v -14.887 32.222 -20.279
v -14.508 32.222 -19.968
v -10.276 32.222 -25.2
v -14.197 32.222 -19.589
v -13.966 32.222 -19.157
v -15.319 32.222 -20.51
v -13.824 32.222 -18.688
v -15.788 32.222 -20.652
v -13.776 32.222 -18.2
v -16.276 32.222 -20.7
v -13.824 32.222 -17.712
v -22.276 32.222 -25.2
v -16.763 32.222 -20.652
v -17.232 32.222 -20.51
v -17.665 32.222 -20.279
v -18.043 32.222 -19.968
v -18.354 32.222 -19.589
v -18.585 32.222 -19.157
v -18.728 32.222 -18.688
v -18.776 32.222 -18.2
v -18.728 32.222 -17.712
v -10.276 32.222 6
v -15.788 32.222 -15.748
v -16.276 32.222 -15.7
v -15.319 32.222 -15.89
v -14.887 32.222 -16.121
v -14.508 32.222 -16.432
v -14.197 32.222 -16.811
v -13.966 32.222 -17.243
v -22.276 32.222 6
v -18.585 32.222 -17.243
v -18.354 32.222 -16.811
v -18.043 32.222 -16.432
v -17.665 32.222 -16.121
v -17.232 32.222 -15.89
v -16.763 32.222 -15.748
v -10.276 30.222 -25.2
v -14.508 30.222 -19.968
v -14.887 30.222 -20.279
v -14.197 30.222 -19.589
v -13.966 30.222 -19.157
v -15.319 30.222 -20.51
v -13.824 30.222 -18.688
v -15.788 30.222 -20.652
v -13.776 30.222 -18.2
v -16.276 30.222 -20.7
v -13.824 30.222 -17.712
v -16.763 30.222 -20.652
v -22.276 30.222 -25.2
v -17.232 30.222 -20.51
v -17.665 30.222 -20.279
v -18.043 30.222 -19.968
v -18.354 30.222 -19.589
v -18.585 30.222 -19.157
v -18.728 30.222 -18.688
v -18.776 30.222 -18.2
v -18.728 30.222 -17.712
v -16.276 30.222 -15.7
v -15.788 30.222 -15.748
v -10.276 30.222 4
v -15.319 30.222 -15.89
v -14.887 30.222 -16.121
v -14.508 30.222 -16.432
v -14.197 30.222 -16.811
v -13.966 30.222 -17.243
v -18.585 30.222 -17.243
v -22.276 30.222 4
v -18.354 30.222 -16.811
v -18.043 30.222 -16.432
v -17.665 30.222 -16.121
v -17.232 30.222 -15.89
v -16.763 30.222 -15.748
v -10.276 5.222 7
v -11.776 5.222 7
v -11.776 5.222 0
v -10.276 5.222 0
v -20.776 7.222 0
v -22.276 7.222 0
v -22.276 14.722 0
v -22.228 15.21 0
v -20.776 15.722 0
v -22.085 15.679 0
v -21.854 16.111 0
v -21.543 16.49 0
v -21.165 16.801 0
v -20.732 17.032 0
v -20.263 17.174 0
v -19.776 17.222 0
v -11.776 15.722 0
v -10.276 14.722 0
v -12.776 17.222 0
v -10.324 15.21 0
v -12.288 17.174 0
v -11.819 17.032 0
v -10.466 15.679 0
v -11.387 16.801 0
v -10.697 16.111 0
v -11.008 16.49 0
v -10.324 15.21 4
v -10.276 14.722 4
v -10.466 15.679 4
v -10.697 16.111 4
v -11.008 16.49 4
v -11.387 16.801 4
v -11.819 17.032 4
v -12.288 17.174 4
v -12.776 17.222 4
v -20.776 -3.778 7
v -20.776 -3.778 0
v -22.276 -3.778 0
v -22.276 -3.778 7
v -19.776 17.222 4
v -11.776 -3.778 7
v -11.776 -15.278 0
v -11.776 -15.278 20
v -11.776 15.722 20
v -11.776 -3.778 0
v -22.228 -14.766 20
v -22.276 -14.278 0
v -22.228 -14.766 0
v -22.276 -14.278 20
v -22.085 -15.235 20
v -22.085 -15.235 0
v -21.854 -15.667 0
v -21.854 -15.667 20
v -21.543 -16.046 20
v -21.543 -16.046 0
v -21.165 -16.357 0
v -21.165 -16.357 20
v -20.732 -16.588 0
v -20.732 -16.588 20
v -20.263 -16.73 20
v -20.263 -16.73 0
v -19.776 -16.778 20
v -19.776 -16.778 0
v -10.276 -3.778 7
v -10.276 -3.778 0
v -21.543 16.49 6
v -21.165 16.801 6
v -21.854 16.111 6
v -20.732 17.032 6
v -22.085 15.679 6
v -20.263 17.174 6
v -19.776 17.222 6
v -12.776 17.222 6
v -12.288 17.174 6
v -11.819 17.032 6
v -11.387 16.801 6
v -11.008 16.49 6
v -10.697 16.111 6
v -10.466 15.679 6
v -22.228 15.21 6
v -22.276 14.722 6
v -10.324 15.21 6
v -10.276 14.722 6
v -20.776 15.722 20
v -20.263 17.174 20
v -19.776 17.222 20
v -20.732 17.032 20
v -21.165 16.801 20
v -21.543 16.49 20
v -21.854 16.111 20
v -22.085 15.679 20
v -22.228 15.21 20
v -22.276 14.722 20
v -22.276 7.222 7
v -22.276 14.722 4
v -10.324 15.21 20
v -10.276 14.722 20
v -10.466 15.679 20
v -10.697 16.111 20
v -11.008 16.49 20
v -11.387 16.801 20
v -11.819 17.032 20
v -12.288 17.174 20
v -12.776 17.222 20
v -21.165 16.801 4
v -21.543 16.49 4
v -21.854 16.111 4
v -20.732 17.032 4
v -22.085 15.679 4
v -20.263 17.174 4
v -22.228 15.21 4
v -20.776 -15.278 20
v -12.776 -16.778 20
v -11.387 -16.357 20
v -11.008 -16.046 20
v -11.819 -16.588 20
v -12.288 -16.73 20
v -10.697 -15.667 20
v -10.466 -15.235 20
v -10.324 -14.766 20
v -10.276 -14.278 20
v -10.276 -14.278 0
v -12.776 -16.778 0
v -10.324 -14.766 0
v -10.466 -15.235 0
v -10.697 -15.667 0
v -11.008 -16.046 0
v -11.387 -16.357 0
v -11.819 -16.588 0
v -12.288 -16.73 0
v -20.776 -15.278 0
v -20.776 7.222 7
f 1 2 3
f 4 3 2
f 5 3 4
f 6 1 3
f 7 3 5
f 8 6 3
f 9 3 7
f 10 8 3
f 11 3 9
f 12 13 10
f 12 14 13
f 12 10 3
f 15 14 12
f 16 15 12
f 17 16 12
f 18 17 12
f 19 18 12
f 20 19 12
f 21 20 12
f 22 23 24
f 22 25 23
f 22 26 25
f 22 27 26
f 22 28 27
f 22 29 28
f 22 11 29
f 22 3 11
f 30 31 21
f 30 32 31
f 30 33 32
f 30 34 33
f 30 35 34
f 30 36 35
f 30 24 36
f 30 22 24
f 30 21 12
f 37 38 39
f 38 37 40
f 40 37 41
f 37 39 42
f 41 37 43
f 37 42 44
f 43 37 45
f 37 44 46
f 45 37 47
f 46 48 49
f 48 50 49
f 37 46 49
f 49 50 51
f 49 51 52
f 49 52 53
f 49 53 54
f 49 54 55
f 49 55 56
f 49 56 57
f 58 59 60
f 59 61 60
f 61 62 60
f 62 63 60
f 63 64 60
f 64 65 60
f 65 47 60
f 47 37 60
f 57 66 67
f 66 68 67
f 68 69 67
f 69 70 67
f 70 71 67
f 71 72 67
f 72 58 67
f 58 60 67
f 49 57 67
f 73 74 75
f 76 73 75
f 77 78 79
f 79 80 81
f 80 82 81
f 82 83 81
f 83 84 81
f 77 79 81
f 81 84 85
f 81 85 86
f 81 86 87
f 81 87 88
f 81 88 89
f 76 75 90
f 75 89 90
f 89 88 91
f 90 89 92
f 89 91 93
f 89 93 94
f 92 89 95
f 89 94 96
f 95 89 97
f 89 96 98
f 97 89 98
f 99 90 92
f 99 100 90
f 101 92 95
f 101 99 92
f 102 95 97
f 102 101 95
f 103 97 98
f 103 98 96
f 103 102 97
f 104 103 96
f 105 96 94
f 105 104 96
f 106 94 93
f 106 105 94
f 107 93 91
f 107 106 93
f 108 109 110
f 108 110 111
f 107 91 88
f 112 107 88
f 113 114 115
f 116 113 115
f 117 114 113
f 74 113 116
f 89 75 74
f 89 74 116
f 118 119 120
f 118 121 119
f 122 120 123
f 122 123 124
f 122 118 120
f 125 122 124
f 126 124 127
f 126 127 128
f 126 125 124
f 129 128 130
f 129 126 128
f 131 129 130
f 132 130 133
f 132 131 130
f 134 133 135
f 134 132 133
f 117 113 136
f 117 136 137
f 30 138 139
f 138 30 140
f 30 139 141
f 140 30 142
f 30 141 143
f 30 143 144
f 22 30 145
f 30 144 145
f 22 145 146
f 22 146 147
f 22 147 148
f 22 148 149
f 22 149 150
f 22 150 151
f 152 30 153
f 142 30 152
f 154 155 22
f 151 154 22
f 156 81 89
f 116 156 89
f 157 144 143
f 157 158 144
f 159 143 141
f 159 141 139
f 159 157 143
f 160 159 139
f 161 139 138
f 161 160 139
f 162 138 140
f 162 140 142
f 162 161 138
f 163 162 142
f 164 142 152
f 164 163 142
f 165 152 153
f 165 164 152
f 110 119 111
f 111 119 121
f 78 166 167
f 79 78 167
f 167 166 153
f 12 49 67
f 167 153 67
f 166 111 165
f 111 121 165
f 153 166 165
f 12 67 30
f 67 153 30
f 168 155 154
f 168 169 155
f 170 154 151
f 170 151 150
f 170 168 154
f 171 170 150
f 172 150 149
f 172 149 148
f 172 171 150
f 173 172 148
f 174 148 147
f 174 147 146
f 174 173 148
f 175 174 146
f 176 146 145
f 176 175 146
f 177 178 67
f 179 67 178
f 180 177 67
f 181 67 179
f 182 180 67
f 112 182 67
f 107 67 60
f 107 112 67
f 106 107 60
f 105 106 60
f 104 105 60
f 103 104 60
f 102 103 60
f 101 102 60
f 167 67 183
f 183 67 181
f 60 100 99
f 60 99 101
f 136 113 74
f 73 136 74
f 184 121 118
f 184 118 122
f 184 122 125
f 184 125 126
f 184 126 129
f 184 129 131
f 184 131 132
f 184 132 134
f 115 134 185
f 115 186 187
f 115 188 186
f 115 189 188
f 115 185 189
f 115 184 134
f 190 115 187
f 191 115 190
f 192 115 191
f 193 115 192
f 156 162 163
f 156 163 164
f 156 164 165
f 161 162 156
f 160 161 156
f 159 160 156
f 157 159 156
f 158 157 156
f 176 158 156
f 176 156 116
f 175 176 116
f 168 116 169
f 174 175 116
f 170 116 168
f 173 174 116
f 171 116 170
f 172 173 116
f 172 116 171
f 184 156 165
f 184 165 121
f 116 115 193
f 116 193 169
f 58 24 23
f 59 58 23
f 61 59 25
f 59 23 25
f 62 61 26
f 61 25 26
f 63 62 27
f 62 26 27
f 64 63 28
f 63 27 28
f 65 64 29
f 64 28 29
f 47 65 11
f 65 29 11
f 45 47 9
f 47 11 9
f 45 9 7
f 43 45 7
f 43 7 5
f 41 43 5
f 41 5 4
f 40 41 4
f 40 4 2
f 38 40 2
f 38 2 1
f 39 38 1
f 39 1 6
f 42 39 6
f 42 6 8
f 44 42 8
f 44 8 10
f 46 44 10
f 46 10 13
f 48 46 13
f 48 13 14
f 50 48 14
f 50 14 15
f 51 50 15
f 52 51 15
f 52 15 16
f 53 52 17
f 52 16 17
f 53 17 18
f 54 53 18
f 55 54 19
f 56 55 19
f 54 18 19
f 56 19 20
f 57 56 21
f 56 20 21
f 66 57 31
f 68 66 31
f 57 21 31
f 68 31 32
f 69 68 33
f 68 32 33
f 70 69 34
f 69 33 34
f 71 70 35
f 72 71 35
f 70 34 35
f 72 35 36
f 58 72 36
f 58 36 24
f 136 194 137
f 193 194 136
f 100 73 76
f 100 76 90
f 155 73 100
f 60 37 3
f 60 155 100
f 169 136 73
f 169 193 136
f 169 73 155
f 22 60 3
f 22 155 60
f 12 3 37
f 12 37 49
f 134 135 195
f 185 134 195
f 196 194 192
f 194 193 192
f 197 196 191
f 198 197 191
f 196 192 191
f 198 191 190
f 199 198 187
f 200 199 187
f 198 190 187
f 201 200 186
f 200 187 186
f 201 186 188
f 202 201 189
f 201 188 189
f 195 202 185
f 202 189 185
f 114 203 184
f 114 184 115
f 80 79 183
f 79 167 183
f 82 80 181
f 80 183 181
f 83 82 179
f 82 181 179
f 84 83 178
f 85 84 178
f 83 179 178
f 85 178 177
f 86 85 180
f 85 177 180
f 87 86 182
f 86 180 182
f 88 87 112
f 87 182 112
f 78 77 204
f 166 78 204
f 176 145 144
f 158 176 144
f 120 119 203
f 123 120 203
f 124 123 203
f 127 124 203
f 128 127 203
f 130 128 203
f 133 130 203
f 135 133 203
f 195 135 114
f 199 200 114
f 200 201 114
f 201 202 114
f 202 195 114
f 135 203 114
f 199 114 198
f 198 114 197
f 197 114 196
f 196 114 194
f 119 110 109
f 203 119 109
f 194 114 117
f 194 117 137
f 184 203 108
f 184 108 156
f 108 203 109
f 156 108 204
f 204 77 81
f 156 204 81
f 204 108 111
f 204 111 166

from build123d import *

# Parameters (mm, degrees)
ESQUISSE1_W                  = 9
ESQUISSE1_H                  = 31
BOSS_EXTRU_1_DEPTH           = 20
ESQUISSE3_W                  = 12
ESQUISSE3_H                  = 2
BOSS_EXTRU_2_DEPTH           = 15
ESQUISSE4_W                  = 12
ESQUISSE4_H                  = 2
BOSS_EXTRU_3_DEPTH           = 29.2
ESQUISSE5_R                  = 2.5
ENL_V_MAT_EXTRU_3_DEPTH      = 10
CONG_1_R                     = 2.5
CONG_2_R                     = 2.5
ENL_V_MAT_EXTRU_5_DEPTH      = 43.629642176
ENL_V_MAT_EXTRU_5_DEPTH_BACK = 5
ESQUISSE6_W                  = 7
ESQUISSE6_H                  = 11
ENL_V_MAT_EXTRU_2_DEPTH      = 43.629642176
ENL_V_MAT_EXTRU_2_DEPTH_BACK = 5
ESQUISSE2_W                  = 7
ESQUISSE2_H                  = 9


with BuildPart() as part:
    # Esquisse1 → Boss.-Extru.1 (new body)
    with BuildSketch(Plane.XY):
        Polygon((-22.275714661, 15.721830986), (-22.275714661, -12.778169014), (-22.275714661, -16.778169014), (-10.275714661, -16.778169014), (-10.275714661, 17.221830986), (-22.275714661, 17.221830986), align=None)
        with Locations((-16.275714661, 0.221830986)):
            Rectangle(ESQUISSE1_W, ESQUISSE1_H, mode=Mode.SUBTRACT)
    extrude(amount=BOSS_EXTRU_1_DEPTH)

    # Esquisse3 → Boss.-Extru.2 (add)
    with BuildSketch(Plane(origin=(0, 17.221830986, 0), x_dir=(1, 0, 0), z_dir=(0, 1, 0))):
        with Locations((-16.275714661, -5)):
            Rectangle(ESQUISSE3_W, ESQUISSE3_H)
    extrude(amount=BOSS_EXTRU_2_DEPTH)

    # Esquisse4 → Boss.-Extru.3 (add)
    with BuildSketch(Plane(origin=(0, 0, 4), x_dir=(-1, 0, 0), z_dir=(0, 0, -1))):
        with Locations((16.275714661, 31.221830986)):
            Rectangle(ESQUISSE4_W, ESQUISSE4_H)
    extrude(amount=BOSS_EXTRU_3_DEPTH)

    # Esquisse5 → Enlèv. mat.-Extru.3 (cut)
    with BuildSketch(Plane(origin=(0, 32.221830986, 0), x_dir=(1, 0, 0), z_dir=(0, 1, 0))):
        with Locations(Location((-16.275714661, 18.2, 0), (0, 0, 270))):
            Circle(ESQUISSE5_R)
    extrude(amount=-ENL_V_MAT_EXTRU_3_DEPTH, mode=Mode.SUBTRACT)

    # Congé1
    cong_1_edges = [part.edges().sort_by_distance(p)[0] for p in [
        (-10.275714661, 17.221830986, 13),
        (-10.275714661, -16.778169014, 10),
    ]]
    fillet(cong_1_edges, radius=CONG_1_R)

    # Congé2
    cong_2_edges = [part.edges().sort_by_distance(p)[0] for p in [
        (-22.275714661, 17.221830986, 13),
        (-22.275714661, -16.778169014, 10),
        (-22.275714661, 17.221830986, 2),
        (-10.275714661, 17.221830986, 2),
    ]]
    fillet(cong_2_edges, radius=CONG_2_R)

    # Esquisse6 → Enlèv. mat.-Extru.5 (cut, two sides: drawn at the far end of the back side and taken through both)
    with BuildSketch(Plane.ZY.offset(22.275714661).offset(-ENL_V_MAT_EXTRU_5_DEPTH_BACK)):
        with Locations((3.5, 1.721830986)):
            Rectangle(ESQUISSE6_W, ESQUISSE6_H)
    extrude(amount=ENL_V_MAT_EXTRU_5_DEPTH + ENL_V_MAT_EXTRU_5_DEPTH_BACK, mode=Mode.SUBTRACT)

    # Esquisse2 → Enlèv. mat.-Extru.2 (cut, two sides: drawn at the far end of the back side and taken through both)
    with BuildSketch(Plane(origin=(-10.275714661, 0, 0), x_dir=(0, 0, -1), z_dir=(1, 0, 0)).offset(-ENL_V_MAT_EXTRU_2_DEPTH_BACK)):
        with Locations((-3.5, 0.721830986)):
            Rectangle(ESQUISSE2_W, ESQUISSE2_H)
    extrude(amount=ENL_V_MAT_EXTRU_2_DEPTH + ENL_V_MAT_EXTRU_2_DEPTH_BACK, mode=Mode.SUBTRACT)


solid = part.part
